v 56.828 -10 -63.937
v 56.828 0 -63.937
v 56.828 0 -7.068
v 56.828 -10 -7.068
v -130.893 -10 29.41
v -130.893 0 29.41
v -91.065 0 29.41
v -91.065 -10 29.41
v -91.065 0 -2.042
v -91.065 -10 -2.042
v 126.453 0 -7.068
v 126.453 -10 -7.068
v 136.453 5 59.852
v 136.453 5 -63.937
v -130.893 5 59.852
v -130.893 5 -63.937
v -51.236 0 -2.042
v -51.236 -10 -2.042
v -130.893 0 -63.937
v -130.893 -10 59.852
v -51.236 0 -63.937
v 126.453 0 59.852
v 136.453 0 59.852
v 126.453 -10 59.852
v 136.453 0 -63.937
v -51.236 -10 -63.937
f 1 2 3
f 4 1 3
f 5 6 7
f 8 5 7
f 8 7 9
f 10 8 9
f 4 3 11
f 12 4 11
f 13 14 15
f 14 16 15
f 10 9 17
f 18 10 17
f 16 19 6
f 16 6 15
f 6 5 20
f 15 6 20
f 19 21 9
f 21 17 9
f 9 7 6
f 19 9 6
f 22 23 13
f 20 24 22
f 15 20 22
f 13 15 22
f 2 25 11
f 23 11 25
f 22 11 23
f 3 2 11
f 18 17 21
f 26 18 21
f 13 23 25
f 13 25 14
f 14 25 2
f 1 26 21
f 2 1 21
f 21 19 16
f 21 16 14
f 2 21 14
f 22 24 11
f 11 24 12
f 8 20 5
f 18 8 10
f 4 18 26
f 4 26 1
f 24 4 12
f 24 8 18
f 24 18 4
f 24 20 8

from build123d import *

# Parameters (mm, degrees)
F1_DEPTH = 10
F2_W     = 69.6255117655
F2_H     = 56.8695068359
F3_DEPTH = 5
F4_W     = 5
F4_H     = 123.7891986966
F5_DEPTH = 10


with BuildPart() as f1:
    # F0 (on Front) → F1 (new body)
    with BuildSketch(Plane.XZ):
        Polygon((126.4532655478, 59.8521605134), (-130.8932900429, 59.8521605134), (-130.8932900429, 29.4098556042), (-91.0648927093, 29.4098556042), (-91.0648927093, -2.0424388349), (-51.2364953756, -2.0424388349), (-51.2364953756, -63.9370381832), (56.8277537823, -63.9370381832), (56.8277537823, -7.0675313473), (126.4532655478, -7.0675313473), align=None)
    extrude(amount=F1_DEPTH)

    # F2 (on face) → F3 (join)
    with BuildSketch(Plane(origin=(0, 0, 0), x_dir=(-1, 0, 0), z_dir=(0, 1, 0))):
        Polygon((51.2364953756, -63.9370381832), (130.8932900429, -63.9370381832), (130.8932900429, 29.4098556042), (91.0648927093, 29.4098556042), (91.0648927093, -2.0424388349), (51.2364953756, -2.0424388349), align=None)
        with Locations((-91.640509665, -35.5022847652)):
            Rectangle(F2_W, F2_H)
        Polygon((-56.8277537823, -63.9370381832), (51.2364953756, -63.9370381832), (51.2364953756, -2.0424388349), (91.0648927093, -2.0424388349), (91.0648927093, 29.4098556042), (130.8932900429, 29.4098556042), (130.8932900429, 59.8521605134), (-126.4532655478, 59.8521605134), (-126.4532655478, -7.0675313473), (-56.8277537823, -7.0675313473), align=None)
    extrude(amount=F3_DEPTH)

    # F4 (on face) → F5 (join)
    with BuildSketch(Plane.YZ.offset(126.4532655478)):
        with Locations((2.5, -2.0424388349)):
            Rectangle(F4_W, F4_H)
    extrude(amount=F5_DEPTH)


solid = f1.part
